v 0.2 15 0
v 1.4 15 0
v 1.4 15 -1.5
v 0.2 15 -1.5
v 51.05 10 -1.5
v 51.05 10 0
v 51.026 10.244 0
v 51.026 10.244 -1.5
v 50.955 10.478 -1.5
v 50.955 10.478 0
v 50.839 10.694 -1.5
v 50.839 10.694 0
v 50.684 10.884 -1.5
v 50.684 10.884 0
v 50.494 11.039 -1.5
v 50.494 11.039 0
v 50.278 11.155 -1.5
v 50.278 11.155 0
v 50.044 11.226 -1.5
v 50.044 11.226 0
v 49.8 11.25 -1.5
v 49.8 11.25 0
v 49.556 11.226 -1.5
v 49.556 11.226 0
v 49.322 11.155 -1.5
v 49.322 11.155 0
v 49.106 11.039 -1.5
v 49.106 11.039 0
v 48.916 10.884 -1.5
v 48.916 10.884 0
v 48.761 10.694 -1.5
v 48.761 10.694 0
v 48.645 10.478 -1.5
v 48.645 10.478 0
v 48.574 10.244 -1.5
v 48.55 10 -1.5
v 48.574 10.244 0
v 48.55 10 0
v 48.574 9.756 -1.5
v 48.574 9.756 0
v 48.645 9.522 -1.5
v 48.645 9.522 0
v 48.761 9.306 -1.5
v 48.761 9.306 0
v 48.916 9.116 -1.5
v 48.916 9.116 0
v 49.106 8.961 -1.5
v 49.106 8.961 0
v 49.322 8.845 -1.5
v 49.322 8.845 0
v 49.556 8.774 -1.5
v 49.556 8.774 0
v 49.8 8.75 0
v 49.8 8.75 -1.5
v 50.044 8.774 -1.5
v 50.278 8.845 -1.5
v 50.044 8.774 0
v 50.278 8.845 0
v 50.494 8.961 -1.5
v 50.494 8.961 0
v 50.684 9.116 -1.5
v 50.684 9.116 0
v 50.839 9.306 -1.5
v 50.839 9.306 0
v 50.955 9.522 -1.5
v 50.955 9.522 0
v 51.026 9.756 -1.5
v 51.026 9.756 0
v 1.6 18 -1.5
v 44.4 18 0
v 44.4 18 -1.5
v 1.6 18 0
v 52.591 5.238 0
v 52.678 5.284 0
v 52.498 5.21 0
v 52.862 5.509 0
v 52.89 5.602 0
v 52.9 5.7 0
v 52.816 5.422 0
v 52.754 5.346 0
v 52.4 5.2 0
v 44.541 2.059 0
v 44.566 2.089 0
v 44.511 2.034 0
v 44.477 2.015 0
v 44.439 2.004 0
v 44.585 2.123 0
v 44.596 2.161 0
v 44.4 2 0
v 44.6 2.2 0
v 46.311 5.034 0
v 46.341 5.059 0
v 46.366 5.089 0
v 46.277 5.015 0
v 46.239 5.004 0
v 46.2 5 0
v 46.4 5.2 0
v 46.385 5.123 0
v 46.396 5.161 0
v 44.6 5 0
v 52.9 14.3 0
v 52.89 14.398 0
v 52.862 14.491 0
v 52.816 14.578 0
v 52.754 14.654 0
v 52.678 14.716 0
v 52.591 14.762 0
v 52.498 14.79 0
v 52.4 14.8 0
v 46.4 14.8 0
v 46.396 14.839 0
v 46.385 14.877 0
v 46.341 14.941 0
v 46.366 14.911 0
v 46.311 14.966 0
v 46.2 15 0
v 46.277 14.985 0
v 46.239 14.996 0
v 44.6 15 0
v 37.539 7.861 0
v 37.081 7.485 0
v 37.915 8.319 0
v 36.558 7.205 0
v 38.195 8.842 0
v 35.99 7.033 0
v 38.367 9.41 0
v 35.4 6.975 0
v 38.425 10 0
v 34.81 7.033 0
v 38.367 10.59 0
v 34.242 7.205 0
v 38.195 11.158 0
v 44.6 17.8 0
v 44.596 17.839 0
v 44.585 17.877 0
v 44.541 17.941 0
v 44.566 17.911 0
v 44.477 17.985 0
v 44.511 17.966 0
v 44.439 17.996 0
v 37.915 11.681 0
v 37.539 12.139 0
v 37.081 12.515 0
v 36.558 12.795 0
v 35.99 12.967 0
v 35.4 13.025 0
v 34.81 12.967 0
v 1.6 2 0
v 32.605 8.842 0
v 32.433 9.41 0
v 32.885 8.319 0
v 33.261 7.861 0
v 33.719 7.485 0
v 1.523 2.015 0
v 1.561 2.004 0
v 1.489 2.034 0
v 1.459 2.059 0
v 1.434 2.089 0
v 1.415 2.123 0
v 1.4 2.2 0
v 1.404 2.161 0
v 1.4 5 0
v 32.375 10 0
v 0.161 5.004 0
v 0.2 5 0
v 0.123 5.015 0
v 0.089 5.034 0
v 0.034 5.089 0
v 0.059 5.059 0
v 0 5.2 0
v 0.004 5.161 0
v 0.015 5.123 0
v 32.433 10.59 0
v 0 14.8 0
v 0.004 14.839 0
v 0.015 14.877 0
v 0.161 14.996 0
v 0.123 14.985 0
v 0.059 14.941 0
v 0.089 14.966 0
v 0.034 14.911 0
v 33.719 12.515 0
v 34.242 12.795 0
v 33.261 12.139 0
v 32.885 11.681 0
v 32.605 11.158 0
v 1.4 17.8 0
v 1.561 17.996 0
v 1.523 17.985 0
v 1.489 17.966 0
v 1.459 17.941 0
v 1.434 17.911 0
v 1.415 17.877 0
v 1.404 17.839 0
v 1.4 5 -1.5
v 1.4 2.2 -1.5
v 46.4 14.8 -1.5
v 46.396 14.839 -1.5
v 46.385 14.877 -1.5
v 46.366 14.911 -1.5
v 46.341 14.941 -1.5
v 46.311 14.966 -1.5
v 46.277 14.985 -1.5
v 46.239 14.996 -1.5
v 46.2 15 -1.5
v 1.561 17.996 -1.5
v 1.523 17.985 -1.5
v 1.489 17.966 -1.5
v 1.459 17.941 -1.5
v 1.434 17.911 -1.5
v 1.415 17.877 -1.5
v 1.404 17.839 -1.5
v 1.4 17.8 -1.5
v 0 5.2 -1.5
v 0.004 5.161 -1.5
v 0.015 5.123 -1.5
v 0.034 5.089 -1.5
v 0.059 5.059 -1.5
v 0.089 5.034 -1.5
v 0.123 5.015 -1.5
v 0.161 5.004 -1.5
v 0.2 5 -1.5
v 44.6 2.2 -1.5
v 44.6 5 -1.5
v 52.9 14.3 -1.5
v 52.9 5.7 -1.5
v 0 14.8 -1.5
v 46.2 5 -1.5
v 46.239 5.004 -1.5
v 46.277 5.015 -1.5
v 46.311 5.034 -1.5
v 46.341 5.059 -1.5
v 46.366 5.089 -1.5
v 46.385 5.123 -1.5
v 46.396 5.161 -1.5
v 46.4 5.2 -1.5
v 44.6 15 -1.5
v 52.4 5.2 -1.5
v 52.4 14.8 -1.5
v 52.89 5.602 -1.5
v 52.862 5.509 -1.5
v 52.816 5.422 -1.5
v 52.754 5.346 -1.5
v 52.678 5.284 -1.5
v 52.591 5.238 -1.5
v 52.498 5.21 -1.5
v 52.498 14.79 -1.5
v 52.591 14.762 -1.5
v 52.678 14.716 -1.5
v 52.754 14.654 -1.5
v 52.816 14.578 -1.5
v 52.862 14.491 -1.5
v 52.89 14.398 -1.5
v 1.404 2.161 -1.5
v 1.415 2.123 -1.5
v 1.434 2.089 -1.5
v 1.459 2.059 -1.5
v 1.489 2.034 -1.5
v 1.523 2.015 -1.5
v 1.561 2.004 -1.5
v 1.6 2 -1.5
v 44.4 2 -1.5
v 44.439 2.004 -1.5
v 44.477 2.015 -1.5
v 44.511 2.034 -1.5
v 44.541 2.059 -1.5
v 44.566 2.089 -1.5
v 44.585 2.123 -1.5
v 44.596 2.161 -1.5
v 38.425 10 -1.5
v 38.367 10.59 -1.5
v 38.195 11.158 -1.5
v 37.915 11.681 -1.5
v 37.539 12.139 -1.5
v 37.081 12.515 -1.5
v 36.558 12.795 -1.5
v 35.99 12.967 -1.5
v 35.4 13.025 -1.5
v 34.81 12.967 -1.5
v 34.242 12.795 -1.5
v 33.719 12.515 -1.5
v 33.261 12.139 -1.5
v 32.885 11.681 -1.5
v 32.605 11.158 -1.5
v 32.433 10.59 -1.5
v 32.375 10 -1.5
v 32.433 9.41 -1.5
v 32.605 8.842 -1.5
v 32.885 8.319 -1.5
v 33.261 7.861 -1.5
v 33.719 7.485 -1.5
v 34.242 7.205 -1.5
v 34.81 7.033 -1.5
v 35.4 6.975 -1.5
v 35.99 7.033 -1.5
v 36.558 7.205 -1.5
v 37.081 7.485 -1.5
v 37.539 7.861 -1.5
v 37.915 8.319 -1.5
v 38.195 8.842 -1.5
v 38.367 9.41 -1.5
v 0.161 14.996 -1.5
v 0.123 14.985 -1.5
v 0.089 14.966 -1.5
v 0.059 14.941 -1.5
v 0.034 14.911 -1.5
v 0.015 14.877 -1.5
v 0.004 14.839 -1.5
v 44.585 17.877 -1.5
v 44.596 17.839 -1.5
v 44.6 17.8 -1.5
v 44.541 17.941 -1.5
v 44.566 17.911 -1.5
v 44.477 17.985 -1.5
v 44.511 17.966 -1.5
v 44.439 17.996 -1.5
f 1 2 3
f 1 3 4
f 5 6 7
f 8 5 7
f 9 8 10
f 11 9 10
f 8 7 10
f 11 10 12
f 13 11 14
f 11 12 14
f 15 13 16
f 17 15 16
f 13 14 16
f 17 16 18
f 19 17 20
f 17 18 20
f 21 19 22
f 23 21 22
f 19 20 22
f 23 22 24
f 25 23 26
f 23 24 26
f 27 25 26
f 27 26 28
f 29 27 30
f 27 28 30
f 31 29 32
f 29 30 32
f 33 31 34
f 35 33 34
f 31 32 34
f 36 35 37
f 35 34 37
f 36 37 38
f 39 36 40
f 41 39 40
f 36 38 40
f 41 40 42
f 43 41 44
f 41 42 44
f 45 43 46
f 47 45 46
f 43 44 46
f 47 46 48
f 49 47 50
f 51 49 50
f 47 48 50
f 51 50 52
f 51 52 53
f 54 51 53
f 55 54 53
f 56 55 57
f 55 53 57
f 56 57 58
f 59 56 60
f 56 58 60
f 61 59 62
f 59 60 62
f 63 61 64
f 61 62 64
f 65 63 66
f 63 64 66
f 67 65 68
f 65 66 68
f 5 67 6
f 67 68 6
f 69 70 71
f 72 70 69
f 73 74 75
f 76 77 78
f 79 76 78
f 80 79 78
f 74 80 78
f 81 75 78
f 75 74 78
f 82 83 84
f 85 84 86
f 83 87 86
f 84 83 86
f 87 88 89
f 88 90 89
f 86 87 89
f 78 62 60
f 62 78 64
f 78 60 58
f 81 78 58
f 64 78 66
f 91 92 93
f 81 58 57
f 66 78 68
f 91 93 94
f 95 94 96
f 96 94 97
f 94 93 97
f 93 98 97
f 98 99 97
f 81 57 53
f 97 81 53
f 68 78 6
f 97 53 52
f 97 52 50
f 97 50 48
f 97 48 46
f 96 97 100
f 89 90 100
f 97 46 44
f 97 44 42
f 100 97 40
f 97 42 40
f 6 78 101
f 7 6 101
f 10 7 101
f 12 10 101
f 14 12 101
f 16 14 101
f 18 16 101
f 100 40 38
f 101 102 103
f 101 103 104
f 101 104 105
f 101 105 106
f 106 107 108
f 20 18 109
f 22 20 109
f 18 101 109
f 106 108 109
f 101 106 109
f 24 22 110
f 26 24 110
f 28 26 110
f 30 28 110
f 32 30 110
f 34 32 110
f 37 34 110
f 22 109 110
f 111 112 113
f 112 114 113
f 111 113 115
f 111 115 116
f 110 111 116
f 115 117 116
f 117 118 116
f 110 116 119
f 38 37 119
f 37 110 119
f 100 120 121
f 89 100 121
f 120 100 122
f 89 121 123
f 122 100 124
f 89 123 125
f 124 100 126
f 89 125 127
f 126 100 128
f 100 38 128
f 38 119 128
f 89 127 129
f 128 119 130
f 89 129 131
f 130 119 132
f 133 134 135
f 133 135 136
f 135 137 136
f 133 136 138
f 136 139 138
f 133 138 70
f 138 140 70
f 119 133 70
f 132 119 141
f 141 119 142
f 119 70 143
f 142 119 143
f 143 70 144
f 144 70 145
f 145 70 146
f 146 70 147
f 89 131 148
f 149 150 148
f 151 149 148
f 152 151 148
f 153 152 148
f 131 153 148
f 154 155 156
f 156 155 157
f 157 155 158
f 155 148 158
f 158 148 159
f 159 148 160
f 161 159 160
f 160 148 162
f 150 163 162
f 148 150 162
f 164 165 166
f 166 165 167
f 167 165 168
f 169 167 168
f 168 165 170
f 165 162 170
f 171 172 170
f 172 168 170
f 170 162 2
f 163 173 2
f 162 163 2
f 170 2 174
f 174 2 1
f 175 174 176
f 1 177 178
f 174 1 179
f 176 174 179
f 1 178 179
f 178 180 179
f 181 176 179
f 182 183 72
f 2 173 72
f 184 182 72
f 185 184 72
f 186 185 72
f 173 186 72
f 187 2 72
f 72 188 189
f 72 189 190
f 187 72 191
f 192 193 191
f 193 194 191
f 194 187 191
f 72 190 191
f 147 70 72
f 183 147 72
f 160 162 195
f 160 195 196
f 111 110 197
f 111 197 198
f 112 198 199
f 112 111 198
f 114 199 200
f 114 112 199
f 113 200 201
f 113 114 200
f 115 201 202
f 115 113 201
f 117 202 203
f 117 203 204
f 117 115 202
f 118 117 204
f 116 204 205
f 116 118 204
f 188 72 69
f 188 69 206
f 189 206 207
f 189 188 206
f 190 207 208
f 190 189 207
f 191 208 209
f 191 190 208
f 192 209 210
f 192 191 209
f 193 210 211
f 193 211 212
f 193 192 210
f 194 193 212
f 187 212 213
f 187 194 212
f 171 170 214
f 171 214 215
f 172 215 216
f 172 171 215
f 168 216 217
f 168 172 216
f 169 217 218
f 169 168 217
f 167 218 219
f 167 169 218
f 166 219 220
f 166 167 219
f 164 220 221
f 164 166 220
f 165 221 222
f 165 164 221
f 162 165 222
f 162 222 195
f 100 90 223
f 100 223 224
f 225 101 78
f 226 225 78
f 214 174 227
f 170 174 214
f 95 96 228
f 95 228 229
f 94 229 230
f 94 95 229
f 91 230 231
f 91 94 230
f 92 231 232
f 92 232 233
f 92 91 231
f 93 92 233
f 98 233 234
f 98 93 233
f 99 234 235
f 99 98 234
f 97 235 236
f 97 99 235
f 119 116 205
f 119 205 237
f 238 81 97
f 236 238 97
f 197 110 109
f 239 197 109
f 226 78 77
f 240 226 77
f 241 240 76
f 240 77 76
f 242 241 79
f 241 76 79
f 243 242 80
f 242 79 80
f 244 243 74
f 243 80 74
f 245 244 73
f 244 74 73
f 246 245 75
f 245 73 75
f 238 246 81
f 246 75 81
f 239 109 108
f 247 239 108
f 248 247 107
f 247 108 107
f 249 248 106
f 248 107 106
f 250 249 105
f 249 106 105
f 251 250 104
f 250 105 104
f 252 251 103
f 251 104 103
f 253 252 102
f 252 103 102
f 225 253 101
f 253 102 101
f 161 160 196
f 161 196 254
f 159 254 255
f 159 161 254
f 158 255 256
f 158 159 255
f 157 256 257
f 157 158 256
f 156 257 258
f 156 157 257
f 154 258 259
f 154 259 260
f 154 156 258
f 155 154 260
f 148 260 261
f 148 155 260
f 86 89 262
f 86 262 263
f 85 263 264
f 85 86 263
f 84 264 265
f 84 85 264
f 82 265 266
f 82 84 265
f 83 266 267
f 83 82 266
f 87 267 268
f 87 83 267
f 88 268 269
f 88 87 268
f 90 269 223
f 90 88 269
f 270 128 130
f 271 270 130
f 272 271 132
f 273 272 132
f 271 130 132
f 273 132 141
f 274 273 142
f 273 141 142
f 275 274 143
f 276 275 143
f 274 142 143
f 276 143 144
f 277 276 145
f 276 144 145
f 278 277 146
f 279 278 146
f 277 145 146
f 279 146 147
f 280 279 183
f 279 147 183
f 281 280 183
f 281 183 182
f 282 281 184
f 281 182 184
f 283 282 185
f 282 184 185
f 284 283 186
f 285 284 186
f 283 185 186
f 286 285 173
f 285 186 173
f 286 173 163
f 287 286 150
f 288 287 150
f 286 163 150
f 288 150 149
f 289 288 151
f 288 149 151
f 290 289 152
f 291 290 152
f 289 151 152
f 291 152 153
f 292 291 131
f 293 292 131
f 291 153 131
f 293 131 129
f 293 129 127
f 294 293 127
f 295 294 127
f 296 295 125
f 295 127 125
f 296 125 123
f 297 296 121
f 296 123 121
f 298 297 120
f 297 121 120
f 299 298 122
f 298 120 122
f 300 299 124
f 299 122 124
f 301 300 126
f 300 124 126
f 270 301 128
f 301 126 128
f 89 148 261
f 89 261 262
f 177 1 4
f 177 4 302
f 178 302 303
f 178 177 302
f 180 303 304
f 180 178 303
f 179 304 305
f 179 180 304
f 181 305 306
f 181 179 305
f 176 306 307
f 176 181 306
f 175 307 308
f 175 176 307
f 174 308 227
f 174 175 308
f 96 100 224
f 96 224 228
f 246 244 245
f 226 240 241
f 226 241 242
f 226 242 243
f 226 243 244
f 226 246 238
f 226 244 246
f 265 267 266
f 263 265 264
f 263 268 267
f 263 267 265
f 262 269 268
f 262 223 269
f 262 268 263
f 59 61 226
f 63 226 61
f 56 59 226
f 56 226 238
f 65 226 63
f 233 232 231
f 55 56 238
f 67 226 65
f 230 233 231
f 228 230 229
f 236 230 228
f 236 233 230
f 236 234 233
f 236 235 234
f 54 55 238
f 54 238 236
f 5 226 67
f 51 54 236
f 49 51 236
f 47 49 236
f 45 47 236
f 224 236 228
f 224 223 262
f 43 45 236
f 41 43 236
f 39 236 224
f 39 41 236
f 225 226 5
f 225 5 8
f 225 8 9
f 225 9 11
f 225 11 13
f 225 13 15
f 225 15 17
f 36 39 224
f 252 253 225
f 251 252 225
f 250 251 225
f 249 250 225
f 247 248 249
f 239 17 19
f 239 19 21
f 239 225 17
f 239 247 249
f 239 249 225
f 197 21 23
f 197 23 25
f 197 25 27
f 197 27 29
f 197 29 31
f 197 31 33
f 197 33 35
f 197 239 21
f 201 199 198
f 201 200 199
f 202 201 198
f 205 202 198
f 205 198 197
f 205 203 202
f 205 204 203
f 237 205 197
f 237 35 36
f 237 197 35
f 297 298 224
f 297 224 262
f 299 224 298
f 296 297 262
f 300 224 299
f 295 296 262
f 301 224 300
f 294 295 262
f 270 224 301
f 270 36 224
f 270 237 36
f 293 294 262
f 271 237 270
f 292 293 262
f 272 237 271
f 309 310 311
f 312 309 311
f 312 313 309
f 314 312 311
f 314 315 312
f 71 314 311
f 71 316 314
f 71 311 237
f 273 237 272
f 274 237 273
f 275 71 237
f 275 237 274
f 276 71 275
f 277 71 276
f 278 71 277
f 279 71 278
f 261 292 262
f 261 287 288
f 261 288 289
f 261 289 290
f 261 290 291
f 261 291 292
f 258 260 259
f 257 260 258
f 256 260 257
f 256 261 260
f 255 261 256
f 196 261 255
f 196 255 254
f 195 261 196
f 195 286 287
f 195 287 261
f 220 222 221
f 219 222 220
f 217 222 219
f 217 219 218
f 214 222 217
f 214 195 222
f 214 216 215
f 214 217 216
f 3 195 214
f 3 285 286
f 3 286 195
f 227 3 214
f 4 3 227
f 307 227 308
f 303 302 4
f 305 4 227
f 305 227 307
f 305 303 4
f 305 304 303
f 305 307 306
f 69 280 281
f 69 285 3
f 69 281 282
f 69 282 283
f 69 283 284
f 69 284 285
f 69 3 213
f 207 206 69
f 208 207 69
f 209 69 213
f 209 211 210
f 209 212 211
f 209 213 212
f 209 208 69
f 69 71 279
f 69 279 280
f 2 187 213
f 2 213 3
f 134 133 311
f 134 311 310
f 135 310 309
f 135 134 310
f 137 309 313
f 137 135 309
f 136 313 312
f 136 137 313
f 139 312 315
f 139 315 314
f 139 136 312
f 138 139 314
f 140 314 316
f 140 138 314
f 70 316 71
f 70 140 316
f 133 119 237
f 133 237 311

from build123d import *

# Parameters (mm, degrees)
SKETCH1_R          = 3.025
BASE_FLANGE1_DEPTH = 1.5
SKETCH6_R          = 1.25
TAB1_DEPTH         = 1.5


# Sheet-metal steps are written as plain solids
with BuildPart() as part:
    # Sketch1 → Base-Flange1 (new body)
    with BuildSketch(Plane.XY):
        with BuildLine():
            Line((1.4, 17.8), (1.4, 15))
            Line((1.4, 15), (0.2, 15))
            ThreePointArc((0.2, 15), (0.058578644, 14.941421356), (0, 14.8))
            Line((0, 14.8), (0, 5.2))
            ThreePointArc((0, 5.2), (0.058578644, 5.058578644), (0.2, 5))
            Line((0.2, 5), (1.4, 5))
            Line((1.4, 5), (1.4, 2.2))
            ThreePointArc((1.4, 2.2), (1.458578644, 2.058578644), (1.6, 2))
            Line((1.6, 2), (44.4, 2))
            ThreePointArc((44.4, 2), (44.541421356, 2.058578644), (44.6, 2.2))
            Line((44.6, 2.2), (44.6, 5))
            Line((44.6, 5), (46.2, 5))
            ThreePointArc((46.2, 5), (46.341421356, 5.058578644), (46.4, 5.2))
            Line((46.4, 5.2), (46.4, 14.8))
            ThreePointArc((46.4, 14.8), (46.341421356, 14.941421356), (46.2, 15))
            Line((46.2, 15), (44.6, 15))
            Line((44.6, 15), (44.6, 17.8))
            ThreePointArc((44.6, 17.8), (44.541421356, 17.941421356), (44.4, 18))
            Line((44.4, 18), (1.6, 18))
            ThreePointArc((1.6, 18), (1.458578644, 17.941421356), (1.4, 17.8))
        make_face()
        with Locations((35.4, 10)):
            Circle(SKETCH1_R, mode=Mode.SUBTRACT)
    extrude(amount=-BASE_FLANGE1_DEPTH)

    # Sketch6 → Tab1 (add)
    with BuildSketch(Plane.XY):
        with BuildLine():
            Line((46.4, 14.8), (52.4, 14.8))
            ThreePointArc((52.4, 14.8), (52.753553391, 14.653553391), (52.9, 14.3))
            Line((52.9, 14.3), (52.9, 5.7))
            ThreePointArc((52.9, 5.7), (52.753553391, 5.346446609), (52.4, 5.2))
            Line((52.4, 5.2), (46.4, 5.2))
            Line((46.4, 5.2), (46.4, 14.8))
        make_face()
        with Locations((49.8, 10)):
            Circle(SKETCH6_R, mode=Mode.SUBTRACT)
    extrude(amount=-TAB1_DEPTH)


solid = part.part
